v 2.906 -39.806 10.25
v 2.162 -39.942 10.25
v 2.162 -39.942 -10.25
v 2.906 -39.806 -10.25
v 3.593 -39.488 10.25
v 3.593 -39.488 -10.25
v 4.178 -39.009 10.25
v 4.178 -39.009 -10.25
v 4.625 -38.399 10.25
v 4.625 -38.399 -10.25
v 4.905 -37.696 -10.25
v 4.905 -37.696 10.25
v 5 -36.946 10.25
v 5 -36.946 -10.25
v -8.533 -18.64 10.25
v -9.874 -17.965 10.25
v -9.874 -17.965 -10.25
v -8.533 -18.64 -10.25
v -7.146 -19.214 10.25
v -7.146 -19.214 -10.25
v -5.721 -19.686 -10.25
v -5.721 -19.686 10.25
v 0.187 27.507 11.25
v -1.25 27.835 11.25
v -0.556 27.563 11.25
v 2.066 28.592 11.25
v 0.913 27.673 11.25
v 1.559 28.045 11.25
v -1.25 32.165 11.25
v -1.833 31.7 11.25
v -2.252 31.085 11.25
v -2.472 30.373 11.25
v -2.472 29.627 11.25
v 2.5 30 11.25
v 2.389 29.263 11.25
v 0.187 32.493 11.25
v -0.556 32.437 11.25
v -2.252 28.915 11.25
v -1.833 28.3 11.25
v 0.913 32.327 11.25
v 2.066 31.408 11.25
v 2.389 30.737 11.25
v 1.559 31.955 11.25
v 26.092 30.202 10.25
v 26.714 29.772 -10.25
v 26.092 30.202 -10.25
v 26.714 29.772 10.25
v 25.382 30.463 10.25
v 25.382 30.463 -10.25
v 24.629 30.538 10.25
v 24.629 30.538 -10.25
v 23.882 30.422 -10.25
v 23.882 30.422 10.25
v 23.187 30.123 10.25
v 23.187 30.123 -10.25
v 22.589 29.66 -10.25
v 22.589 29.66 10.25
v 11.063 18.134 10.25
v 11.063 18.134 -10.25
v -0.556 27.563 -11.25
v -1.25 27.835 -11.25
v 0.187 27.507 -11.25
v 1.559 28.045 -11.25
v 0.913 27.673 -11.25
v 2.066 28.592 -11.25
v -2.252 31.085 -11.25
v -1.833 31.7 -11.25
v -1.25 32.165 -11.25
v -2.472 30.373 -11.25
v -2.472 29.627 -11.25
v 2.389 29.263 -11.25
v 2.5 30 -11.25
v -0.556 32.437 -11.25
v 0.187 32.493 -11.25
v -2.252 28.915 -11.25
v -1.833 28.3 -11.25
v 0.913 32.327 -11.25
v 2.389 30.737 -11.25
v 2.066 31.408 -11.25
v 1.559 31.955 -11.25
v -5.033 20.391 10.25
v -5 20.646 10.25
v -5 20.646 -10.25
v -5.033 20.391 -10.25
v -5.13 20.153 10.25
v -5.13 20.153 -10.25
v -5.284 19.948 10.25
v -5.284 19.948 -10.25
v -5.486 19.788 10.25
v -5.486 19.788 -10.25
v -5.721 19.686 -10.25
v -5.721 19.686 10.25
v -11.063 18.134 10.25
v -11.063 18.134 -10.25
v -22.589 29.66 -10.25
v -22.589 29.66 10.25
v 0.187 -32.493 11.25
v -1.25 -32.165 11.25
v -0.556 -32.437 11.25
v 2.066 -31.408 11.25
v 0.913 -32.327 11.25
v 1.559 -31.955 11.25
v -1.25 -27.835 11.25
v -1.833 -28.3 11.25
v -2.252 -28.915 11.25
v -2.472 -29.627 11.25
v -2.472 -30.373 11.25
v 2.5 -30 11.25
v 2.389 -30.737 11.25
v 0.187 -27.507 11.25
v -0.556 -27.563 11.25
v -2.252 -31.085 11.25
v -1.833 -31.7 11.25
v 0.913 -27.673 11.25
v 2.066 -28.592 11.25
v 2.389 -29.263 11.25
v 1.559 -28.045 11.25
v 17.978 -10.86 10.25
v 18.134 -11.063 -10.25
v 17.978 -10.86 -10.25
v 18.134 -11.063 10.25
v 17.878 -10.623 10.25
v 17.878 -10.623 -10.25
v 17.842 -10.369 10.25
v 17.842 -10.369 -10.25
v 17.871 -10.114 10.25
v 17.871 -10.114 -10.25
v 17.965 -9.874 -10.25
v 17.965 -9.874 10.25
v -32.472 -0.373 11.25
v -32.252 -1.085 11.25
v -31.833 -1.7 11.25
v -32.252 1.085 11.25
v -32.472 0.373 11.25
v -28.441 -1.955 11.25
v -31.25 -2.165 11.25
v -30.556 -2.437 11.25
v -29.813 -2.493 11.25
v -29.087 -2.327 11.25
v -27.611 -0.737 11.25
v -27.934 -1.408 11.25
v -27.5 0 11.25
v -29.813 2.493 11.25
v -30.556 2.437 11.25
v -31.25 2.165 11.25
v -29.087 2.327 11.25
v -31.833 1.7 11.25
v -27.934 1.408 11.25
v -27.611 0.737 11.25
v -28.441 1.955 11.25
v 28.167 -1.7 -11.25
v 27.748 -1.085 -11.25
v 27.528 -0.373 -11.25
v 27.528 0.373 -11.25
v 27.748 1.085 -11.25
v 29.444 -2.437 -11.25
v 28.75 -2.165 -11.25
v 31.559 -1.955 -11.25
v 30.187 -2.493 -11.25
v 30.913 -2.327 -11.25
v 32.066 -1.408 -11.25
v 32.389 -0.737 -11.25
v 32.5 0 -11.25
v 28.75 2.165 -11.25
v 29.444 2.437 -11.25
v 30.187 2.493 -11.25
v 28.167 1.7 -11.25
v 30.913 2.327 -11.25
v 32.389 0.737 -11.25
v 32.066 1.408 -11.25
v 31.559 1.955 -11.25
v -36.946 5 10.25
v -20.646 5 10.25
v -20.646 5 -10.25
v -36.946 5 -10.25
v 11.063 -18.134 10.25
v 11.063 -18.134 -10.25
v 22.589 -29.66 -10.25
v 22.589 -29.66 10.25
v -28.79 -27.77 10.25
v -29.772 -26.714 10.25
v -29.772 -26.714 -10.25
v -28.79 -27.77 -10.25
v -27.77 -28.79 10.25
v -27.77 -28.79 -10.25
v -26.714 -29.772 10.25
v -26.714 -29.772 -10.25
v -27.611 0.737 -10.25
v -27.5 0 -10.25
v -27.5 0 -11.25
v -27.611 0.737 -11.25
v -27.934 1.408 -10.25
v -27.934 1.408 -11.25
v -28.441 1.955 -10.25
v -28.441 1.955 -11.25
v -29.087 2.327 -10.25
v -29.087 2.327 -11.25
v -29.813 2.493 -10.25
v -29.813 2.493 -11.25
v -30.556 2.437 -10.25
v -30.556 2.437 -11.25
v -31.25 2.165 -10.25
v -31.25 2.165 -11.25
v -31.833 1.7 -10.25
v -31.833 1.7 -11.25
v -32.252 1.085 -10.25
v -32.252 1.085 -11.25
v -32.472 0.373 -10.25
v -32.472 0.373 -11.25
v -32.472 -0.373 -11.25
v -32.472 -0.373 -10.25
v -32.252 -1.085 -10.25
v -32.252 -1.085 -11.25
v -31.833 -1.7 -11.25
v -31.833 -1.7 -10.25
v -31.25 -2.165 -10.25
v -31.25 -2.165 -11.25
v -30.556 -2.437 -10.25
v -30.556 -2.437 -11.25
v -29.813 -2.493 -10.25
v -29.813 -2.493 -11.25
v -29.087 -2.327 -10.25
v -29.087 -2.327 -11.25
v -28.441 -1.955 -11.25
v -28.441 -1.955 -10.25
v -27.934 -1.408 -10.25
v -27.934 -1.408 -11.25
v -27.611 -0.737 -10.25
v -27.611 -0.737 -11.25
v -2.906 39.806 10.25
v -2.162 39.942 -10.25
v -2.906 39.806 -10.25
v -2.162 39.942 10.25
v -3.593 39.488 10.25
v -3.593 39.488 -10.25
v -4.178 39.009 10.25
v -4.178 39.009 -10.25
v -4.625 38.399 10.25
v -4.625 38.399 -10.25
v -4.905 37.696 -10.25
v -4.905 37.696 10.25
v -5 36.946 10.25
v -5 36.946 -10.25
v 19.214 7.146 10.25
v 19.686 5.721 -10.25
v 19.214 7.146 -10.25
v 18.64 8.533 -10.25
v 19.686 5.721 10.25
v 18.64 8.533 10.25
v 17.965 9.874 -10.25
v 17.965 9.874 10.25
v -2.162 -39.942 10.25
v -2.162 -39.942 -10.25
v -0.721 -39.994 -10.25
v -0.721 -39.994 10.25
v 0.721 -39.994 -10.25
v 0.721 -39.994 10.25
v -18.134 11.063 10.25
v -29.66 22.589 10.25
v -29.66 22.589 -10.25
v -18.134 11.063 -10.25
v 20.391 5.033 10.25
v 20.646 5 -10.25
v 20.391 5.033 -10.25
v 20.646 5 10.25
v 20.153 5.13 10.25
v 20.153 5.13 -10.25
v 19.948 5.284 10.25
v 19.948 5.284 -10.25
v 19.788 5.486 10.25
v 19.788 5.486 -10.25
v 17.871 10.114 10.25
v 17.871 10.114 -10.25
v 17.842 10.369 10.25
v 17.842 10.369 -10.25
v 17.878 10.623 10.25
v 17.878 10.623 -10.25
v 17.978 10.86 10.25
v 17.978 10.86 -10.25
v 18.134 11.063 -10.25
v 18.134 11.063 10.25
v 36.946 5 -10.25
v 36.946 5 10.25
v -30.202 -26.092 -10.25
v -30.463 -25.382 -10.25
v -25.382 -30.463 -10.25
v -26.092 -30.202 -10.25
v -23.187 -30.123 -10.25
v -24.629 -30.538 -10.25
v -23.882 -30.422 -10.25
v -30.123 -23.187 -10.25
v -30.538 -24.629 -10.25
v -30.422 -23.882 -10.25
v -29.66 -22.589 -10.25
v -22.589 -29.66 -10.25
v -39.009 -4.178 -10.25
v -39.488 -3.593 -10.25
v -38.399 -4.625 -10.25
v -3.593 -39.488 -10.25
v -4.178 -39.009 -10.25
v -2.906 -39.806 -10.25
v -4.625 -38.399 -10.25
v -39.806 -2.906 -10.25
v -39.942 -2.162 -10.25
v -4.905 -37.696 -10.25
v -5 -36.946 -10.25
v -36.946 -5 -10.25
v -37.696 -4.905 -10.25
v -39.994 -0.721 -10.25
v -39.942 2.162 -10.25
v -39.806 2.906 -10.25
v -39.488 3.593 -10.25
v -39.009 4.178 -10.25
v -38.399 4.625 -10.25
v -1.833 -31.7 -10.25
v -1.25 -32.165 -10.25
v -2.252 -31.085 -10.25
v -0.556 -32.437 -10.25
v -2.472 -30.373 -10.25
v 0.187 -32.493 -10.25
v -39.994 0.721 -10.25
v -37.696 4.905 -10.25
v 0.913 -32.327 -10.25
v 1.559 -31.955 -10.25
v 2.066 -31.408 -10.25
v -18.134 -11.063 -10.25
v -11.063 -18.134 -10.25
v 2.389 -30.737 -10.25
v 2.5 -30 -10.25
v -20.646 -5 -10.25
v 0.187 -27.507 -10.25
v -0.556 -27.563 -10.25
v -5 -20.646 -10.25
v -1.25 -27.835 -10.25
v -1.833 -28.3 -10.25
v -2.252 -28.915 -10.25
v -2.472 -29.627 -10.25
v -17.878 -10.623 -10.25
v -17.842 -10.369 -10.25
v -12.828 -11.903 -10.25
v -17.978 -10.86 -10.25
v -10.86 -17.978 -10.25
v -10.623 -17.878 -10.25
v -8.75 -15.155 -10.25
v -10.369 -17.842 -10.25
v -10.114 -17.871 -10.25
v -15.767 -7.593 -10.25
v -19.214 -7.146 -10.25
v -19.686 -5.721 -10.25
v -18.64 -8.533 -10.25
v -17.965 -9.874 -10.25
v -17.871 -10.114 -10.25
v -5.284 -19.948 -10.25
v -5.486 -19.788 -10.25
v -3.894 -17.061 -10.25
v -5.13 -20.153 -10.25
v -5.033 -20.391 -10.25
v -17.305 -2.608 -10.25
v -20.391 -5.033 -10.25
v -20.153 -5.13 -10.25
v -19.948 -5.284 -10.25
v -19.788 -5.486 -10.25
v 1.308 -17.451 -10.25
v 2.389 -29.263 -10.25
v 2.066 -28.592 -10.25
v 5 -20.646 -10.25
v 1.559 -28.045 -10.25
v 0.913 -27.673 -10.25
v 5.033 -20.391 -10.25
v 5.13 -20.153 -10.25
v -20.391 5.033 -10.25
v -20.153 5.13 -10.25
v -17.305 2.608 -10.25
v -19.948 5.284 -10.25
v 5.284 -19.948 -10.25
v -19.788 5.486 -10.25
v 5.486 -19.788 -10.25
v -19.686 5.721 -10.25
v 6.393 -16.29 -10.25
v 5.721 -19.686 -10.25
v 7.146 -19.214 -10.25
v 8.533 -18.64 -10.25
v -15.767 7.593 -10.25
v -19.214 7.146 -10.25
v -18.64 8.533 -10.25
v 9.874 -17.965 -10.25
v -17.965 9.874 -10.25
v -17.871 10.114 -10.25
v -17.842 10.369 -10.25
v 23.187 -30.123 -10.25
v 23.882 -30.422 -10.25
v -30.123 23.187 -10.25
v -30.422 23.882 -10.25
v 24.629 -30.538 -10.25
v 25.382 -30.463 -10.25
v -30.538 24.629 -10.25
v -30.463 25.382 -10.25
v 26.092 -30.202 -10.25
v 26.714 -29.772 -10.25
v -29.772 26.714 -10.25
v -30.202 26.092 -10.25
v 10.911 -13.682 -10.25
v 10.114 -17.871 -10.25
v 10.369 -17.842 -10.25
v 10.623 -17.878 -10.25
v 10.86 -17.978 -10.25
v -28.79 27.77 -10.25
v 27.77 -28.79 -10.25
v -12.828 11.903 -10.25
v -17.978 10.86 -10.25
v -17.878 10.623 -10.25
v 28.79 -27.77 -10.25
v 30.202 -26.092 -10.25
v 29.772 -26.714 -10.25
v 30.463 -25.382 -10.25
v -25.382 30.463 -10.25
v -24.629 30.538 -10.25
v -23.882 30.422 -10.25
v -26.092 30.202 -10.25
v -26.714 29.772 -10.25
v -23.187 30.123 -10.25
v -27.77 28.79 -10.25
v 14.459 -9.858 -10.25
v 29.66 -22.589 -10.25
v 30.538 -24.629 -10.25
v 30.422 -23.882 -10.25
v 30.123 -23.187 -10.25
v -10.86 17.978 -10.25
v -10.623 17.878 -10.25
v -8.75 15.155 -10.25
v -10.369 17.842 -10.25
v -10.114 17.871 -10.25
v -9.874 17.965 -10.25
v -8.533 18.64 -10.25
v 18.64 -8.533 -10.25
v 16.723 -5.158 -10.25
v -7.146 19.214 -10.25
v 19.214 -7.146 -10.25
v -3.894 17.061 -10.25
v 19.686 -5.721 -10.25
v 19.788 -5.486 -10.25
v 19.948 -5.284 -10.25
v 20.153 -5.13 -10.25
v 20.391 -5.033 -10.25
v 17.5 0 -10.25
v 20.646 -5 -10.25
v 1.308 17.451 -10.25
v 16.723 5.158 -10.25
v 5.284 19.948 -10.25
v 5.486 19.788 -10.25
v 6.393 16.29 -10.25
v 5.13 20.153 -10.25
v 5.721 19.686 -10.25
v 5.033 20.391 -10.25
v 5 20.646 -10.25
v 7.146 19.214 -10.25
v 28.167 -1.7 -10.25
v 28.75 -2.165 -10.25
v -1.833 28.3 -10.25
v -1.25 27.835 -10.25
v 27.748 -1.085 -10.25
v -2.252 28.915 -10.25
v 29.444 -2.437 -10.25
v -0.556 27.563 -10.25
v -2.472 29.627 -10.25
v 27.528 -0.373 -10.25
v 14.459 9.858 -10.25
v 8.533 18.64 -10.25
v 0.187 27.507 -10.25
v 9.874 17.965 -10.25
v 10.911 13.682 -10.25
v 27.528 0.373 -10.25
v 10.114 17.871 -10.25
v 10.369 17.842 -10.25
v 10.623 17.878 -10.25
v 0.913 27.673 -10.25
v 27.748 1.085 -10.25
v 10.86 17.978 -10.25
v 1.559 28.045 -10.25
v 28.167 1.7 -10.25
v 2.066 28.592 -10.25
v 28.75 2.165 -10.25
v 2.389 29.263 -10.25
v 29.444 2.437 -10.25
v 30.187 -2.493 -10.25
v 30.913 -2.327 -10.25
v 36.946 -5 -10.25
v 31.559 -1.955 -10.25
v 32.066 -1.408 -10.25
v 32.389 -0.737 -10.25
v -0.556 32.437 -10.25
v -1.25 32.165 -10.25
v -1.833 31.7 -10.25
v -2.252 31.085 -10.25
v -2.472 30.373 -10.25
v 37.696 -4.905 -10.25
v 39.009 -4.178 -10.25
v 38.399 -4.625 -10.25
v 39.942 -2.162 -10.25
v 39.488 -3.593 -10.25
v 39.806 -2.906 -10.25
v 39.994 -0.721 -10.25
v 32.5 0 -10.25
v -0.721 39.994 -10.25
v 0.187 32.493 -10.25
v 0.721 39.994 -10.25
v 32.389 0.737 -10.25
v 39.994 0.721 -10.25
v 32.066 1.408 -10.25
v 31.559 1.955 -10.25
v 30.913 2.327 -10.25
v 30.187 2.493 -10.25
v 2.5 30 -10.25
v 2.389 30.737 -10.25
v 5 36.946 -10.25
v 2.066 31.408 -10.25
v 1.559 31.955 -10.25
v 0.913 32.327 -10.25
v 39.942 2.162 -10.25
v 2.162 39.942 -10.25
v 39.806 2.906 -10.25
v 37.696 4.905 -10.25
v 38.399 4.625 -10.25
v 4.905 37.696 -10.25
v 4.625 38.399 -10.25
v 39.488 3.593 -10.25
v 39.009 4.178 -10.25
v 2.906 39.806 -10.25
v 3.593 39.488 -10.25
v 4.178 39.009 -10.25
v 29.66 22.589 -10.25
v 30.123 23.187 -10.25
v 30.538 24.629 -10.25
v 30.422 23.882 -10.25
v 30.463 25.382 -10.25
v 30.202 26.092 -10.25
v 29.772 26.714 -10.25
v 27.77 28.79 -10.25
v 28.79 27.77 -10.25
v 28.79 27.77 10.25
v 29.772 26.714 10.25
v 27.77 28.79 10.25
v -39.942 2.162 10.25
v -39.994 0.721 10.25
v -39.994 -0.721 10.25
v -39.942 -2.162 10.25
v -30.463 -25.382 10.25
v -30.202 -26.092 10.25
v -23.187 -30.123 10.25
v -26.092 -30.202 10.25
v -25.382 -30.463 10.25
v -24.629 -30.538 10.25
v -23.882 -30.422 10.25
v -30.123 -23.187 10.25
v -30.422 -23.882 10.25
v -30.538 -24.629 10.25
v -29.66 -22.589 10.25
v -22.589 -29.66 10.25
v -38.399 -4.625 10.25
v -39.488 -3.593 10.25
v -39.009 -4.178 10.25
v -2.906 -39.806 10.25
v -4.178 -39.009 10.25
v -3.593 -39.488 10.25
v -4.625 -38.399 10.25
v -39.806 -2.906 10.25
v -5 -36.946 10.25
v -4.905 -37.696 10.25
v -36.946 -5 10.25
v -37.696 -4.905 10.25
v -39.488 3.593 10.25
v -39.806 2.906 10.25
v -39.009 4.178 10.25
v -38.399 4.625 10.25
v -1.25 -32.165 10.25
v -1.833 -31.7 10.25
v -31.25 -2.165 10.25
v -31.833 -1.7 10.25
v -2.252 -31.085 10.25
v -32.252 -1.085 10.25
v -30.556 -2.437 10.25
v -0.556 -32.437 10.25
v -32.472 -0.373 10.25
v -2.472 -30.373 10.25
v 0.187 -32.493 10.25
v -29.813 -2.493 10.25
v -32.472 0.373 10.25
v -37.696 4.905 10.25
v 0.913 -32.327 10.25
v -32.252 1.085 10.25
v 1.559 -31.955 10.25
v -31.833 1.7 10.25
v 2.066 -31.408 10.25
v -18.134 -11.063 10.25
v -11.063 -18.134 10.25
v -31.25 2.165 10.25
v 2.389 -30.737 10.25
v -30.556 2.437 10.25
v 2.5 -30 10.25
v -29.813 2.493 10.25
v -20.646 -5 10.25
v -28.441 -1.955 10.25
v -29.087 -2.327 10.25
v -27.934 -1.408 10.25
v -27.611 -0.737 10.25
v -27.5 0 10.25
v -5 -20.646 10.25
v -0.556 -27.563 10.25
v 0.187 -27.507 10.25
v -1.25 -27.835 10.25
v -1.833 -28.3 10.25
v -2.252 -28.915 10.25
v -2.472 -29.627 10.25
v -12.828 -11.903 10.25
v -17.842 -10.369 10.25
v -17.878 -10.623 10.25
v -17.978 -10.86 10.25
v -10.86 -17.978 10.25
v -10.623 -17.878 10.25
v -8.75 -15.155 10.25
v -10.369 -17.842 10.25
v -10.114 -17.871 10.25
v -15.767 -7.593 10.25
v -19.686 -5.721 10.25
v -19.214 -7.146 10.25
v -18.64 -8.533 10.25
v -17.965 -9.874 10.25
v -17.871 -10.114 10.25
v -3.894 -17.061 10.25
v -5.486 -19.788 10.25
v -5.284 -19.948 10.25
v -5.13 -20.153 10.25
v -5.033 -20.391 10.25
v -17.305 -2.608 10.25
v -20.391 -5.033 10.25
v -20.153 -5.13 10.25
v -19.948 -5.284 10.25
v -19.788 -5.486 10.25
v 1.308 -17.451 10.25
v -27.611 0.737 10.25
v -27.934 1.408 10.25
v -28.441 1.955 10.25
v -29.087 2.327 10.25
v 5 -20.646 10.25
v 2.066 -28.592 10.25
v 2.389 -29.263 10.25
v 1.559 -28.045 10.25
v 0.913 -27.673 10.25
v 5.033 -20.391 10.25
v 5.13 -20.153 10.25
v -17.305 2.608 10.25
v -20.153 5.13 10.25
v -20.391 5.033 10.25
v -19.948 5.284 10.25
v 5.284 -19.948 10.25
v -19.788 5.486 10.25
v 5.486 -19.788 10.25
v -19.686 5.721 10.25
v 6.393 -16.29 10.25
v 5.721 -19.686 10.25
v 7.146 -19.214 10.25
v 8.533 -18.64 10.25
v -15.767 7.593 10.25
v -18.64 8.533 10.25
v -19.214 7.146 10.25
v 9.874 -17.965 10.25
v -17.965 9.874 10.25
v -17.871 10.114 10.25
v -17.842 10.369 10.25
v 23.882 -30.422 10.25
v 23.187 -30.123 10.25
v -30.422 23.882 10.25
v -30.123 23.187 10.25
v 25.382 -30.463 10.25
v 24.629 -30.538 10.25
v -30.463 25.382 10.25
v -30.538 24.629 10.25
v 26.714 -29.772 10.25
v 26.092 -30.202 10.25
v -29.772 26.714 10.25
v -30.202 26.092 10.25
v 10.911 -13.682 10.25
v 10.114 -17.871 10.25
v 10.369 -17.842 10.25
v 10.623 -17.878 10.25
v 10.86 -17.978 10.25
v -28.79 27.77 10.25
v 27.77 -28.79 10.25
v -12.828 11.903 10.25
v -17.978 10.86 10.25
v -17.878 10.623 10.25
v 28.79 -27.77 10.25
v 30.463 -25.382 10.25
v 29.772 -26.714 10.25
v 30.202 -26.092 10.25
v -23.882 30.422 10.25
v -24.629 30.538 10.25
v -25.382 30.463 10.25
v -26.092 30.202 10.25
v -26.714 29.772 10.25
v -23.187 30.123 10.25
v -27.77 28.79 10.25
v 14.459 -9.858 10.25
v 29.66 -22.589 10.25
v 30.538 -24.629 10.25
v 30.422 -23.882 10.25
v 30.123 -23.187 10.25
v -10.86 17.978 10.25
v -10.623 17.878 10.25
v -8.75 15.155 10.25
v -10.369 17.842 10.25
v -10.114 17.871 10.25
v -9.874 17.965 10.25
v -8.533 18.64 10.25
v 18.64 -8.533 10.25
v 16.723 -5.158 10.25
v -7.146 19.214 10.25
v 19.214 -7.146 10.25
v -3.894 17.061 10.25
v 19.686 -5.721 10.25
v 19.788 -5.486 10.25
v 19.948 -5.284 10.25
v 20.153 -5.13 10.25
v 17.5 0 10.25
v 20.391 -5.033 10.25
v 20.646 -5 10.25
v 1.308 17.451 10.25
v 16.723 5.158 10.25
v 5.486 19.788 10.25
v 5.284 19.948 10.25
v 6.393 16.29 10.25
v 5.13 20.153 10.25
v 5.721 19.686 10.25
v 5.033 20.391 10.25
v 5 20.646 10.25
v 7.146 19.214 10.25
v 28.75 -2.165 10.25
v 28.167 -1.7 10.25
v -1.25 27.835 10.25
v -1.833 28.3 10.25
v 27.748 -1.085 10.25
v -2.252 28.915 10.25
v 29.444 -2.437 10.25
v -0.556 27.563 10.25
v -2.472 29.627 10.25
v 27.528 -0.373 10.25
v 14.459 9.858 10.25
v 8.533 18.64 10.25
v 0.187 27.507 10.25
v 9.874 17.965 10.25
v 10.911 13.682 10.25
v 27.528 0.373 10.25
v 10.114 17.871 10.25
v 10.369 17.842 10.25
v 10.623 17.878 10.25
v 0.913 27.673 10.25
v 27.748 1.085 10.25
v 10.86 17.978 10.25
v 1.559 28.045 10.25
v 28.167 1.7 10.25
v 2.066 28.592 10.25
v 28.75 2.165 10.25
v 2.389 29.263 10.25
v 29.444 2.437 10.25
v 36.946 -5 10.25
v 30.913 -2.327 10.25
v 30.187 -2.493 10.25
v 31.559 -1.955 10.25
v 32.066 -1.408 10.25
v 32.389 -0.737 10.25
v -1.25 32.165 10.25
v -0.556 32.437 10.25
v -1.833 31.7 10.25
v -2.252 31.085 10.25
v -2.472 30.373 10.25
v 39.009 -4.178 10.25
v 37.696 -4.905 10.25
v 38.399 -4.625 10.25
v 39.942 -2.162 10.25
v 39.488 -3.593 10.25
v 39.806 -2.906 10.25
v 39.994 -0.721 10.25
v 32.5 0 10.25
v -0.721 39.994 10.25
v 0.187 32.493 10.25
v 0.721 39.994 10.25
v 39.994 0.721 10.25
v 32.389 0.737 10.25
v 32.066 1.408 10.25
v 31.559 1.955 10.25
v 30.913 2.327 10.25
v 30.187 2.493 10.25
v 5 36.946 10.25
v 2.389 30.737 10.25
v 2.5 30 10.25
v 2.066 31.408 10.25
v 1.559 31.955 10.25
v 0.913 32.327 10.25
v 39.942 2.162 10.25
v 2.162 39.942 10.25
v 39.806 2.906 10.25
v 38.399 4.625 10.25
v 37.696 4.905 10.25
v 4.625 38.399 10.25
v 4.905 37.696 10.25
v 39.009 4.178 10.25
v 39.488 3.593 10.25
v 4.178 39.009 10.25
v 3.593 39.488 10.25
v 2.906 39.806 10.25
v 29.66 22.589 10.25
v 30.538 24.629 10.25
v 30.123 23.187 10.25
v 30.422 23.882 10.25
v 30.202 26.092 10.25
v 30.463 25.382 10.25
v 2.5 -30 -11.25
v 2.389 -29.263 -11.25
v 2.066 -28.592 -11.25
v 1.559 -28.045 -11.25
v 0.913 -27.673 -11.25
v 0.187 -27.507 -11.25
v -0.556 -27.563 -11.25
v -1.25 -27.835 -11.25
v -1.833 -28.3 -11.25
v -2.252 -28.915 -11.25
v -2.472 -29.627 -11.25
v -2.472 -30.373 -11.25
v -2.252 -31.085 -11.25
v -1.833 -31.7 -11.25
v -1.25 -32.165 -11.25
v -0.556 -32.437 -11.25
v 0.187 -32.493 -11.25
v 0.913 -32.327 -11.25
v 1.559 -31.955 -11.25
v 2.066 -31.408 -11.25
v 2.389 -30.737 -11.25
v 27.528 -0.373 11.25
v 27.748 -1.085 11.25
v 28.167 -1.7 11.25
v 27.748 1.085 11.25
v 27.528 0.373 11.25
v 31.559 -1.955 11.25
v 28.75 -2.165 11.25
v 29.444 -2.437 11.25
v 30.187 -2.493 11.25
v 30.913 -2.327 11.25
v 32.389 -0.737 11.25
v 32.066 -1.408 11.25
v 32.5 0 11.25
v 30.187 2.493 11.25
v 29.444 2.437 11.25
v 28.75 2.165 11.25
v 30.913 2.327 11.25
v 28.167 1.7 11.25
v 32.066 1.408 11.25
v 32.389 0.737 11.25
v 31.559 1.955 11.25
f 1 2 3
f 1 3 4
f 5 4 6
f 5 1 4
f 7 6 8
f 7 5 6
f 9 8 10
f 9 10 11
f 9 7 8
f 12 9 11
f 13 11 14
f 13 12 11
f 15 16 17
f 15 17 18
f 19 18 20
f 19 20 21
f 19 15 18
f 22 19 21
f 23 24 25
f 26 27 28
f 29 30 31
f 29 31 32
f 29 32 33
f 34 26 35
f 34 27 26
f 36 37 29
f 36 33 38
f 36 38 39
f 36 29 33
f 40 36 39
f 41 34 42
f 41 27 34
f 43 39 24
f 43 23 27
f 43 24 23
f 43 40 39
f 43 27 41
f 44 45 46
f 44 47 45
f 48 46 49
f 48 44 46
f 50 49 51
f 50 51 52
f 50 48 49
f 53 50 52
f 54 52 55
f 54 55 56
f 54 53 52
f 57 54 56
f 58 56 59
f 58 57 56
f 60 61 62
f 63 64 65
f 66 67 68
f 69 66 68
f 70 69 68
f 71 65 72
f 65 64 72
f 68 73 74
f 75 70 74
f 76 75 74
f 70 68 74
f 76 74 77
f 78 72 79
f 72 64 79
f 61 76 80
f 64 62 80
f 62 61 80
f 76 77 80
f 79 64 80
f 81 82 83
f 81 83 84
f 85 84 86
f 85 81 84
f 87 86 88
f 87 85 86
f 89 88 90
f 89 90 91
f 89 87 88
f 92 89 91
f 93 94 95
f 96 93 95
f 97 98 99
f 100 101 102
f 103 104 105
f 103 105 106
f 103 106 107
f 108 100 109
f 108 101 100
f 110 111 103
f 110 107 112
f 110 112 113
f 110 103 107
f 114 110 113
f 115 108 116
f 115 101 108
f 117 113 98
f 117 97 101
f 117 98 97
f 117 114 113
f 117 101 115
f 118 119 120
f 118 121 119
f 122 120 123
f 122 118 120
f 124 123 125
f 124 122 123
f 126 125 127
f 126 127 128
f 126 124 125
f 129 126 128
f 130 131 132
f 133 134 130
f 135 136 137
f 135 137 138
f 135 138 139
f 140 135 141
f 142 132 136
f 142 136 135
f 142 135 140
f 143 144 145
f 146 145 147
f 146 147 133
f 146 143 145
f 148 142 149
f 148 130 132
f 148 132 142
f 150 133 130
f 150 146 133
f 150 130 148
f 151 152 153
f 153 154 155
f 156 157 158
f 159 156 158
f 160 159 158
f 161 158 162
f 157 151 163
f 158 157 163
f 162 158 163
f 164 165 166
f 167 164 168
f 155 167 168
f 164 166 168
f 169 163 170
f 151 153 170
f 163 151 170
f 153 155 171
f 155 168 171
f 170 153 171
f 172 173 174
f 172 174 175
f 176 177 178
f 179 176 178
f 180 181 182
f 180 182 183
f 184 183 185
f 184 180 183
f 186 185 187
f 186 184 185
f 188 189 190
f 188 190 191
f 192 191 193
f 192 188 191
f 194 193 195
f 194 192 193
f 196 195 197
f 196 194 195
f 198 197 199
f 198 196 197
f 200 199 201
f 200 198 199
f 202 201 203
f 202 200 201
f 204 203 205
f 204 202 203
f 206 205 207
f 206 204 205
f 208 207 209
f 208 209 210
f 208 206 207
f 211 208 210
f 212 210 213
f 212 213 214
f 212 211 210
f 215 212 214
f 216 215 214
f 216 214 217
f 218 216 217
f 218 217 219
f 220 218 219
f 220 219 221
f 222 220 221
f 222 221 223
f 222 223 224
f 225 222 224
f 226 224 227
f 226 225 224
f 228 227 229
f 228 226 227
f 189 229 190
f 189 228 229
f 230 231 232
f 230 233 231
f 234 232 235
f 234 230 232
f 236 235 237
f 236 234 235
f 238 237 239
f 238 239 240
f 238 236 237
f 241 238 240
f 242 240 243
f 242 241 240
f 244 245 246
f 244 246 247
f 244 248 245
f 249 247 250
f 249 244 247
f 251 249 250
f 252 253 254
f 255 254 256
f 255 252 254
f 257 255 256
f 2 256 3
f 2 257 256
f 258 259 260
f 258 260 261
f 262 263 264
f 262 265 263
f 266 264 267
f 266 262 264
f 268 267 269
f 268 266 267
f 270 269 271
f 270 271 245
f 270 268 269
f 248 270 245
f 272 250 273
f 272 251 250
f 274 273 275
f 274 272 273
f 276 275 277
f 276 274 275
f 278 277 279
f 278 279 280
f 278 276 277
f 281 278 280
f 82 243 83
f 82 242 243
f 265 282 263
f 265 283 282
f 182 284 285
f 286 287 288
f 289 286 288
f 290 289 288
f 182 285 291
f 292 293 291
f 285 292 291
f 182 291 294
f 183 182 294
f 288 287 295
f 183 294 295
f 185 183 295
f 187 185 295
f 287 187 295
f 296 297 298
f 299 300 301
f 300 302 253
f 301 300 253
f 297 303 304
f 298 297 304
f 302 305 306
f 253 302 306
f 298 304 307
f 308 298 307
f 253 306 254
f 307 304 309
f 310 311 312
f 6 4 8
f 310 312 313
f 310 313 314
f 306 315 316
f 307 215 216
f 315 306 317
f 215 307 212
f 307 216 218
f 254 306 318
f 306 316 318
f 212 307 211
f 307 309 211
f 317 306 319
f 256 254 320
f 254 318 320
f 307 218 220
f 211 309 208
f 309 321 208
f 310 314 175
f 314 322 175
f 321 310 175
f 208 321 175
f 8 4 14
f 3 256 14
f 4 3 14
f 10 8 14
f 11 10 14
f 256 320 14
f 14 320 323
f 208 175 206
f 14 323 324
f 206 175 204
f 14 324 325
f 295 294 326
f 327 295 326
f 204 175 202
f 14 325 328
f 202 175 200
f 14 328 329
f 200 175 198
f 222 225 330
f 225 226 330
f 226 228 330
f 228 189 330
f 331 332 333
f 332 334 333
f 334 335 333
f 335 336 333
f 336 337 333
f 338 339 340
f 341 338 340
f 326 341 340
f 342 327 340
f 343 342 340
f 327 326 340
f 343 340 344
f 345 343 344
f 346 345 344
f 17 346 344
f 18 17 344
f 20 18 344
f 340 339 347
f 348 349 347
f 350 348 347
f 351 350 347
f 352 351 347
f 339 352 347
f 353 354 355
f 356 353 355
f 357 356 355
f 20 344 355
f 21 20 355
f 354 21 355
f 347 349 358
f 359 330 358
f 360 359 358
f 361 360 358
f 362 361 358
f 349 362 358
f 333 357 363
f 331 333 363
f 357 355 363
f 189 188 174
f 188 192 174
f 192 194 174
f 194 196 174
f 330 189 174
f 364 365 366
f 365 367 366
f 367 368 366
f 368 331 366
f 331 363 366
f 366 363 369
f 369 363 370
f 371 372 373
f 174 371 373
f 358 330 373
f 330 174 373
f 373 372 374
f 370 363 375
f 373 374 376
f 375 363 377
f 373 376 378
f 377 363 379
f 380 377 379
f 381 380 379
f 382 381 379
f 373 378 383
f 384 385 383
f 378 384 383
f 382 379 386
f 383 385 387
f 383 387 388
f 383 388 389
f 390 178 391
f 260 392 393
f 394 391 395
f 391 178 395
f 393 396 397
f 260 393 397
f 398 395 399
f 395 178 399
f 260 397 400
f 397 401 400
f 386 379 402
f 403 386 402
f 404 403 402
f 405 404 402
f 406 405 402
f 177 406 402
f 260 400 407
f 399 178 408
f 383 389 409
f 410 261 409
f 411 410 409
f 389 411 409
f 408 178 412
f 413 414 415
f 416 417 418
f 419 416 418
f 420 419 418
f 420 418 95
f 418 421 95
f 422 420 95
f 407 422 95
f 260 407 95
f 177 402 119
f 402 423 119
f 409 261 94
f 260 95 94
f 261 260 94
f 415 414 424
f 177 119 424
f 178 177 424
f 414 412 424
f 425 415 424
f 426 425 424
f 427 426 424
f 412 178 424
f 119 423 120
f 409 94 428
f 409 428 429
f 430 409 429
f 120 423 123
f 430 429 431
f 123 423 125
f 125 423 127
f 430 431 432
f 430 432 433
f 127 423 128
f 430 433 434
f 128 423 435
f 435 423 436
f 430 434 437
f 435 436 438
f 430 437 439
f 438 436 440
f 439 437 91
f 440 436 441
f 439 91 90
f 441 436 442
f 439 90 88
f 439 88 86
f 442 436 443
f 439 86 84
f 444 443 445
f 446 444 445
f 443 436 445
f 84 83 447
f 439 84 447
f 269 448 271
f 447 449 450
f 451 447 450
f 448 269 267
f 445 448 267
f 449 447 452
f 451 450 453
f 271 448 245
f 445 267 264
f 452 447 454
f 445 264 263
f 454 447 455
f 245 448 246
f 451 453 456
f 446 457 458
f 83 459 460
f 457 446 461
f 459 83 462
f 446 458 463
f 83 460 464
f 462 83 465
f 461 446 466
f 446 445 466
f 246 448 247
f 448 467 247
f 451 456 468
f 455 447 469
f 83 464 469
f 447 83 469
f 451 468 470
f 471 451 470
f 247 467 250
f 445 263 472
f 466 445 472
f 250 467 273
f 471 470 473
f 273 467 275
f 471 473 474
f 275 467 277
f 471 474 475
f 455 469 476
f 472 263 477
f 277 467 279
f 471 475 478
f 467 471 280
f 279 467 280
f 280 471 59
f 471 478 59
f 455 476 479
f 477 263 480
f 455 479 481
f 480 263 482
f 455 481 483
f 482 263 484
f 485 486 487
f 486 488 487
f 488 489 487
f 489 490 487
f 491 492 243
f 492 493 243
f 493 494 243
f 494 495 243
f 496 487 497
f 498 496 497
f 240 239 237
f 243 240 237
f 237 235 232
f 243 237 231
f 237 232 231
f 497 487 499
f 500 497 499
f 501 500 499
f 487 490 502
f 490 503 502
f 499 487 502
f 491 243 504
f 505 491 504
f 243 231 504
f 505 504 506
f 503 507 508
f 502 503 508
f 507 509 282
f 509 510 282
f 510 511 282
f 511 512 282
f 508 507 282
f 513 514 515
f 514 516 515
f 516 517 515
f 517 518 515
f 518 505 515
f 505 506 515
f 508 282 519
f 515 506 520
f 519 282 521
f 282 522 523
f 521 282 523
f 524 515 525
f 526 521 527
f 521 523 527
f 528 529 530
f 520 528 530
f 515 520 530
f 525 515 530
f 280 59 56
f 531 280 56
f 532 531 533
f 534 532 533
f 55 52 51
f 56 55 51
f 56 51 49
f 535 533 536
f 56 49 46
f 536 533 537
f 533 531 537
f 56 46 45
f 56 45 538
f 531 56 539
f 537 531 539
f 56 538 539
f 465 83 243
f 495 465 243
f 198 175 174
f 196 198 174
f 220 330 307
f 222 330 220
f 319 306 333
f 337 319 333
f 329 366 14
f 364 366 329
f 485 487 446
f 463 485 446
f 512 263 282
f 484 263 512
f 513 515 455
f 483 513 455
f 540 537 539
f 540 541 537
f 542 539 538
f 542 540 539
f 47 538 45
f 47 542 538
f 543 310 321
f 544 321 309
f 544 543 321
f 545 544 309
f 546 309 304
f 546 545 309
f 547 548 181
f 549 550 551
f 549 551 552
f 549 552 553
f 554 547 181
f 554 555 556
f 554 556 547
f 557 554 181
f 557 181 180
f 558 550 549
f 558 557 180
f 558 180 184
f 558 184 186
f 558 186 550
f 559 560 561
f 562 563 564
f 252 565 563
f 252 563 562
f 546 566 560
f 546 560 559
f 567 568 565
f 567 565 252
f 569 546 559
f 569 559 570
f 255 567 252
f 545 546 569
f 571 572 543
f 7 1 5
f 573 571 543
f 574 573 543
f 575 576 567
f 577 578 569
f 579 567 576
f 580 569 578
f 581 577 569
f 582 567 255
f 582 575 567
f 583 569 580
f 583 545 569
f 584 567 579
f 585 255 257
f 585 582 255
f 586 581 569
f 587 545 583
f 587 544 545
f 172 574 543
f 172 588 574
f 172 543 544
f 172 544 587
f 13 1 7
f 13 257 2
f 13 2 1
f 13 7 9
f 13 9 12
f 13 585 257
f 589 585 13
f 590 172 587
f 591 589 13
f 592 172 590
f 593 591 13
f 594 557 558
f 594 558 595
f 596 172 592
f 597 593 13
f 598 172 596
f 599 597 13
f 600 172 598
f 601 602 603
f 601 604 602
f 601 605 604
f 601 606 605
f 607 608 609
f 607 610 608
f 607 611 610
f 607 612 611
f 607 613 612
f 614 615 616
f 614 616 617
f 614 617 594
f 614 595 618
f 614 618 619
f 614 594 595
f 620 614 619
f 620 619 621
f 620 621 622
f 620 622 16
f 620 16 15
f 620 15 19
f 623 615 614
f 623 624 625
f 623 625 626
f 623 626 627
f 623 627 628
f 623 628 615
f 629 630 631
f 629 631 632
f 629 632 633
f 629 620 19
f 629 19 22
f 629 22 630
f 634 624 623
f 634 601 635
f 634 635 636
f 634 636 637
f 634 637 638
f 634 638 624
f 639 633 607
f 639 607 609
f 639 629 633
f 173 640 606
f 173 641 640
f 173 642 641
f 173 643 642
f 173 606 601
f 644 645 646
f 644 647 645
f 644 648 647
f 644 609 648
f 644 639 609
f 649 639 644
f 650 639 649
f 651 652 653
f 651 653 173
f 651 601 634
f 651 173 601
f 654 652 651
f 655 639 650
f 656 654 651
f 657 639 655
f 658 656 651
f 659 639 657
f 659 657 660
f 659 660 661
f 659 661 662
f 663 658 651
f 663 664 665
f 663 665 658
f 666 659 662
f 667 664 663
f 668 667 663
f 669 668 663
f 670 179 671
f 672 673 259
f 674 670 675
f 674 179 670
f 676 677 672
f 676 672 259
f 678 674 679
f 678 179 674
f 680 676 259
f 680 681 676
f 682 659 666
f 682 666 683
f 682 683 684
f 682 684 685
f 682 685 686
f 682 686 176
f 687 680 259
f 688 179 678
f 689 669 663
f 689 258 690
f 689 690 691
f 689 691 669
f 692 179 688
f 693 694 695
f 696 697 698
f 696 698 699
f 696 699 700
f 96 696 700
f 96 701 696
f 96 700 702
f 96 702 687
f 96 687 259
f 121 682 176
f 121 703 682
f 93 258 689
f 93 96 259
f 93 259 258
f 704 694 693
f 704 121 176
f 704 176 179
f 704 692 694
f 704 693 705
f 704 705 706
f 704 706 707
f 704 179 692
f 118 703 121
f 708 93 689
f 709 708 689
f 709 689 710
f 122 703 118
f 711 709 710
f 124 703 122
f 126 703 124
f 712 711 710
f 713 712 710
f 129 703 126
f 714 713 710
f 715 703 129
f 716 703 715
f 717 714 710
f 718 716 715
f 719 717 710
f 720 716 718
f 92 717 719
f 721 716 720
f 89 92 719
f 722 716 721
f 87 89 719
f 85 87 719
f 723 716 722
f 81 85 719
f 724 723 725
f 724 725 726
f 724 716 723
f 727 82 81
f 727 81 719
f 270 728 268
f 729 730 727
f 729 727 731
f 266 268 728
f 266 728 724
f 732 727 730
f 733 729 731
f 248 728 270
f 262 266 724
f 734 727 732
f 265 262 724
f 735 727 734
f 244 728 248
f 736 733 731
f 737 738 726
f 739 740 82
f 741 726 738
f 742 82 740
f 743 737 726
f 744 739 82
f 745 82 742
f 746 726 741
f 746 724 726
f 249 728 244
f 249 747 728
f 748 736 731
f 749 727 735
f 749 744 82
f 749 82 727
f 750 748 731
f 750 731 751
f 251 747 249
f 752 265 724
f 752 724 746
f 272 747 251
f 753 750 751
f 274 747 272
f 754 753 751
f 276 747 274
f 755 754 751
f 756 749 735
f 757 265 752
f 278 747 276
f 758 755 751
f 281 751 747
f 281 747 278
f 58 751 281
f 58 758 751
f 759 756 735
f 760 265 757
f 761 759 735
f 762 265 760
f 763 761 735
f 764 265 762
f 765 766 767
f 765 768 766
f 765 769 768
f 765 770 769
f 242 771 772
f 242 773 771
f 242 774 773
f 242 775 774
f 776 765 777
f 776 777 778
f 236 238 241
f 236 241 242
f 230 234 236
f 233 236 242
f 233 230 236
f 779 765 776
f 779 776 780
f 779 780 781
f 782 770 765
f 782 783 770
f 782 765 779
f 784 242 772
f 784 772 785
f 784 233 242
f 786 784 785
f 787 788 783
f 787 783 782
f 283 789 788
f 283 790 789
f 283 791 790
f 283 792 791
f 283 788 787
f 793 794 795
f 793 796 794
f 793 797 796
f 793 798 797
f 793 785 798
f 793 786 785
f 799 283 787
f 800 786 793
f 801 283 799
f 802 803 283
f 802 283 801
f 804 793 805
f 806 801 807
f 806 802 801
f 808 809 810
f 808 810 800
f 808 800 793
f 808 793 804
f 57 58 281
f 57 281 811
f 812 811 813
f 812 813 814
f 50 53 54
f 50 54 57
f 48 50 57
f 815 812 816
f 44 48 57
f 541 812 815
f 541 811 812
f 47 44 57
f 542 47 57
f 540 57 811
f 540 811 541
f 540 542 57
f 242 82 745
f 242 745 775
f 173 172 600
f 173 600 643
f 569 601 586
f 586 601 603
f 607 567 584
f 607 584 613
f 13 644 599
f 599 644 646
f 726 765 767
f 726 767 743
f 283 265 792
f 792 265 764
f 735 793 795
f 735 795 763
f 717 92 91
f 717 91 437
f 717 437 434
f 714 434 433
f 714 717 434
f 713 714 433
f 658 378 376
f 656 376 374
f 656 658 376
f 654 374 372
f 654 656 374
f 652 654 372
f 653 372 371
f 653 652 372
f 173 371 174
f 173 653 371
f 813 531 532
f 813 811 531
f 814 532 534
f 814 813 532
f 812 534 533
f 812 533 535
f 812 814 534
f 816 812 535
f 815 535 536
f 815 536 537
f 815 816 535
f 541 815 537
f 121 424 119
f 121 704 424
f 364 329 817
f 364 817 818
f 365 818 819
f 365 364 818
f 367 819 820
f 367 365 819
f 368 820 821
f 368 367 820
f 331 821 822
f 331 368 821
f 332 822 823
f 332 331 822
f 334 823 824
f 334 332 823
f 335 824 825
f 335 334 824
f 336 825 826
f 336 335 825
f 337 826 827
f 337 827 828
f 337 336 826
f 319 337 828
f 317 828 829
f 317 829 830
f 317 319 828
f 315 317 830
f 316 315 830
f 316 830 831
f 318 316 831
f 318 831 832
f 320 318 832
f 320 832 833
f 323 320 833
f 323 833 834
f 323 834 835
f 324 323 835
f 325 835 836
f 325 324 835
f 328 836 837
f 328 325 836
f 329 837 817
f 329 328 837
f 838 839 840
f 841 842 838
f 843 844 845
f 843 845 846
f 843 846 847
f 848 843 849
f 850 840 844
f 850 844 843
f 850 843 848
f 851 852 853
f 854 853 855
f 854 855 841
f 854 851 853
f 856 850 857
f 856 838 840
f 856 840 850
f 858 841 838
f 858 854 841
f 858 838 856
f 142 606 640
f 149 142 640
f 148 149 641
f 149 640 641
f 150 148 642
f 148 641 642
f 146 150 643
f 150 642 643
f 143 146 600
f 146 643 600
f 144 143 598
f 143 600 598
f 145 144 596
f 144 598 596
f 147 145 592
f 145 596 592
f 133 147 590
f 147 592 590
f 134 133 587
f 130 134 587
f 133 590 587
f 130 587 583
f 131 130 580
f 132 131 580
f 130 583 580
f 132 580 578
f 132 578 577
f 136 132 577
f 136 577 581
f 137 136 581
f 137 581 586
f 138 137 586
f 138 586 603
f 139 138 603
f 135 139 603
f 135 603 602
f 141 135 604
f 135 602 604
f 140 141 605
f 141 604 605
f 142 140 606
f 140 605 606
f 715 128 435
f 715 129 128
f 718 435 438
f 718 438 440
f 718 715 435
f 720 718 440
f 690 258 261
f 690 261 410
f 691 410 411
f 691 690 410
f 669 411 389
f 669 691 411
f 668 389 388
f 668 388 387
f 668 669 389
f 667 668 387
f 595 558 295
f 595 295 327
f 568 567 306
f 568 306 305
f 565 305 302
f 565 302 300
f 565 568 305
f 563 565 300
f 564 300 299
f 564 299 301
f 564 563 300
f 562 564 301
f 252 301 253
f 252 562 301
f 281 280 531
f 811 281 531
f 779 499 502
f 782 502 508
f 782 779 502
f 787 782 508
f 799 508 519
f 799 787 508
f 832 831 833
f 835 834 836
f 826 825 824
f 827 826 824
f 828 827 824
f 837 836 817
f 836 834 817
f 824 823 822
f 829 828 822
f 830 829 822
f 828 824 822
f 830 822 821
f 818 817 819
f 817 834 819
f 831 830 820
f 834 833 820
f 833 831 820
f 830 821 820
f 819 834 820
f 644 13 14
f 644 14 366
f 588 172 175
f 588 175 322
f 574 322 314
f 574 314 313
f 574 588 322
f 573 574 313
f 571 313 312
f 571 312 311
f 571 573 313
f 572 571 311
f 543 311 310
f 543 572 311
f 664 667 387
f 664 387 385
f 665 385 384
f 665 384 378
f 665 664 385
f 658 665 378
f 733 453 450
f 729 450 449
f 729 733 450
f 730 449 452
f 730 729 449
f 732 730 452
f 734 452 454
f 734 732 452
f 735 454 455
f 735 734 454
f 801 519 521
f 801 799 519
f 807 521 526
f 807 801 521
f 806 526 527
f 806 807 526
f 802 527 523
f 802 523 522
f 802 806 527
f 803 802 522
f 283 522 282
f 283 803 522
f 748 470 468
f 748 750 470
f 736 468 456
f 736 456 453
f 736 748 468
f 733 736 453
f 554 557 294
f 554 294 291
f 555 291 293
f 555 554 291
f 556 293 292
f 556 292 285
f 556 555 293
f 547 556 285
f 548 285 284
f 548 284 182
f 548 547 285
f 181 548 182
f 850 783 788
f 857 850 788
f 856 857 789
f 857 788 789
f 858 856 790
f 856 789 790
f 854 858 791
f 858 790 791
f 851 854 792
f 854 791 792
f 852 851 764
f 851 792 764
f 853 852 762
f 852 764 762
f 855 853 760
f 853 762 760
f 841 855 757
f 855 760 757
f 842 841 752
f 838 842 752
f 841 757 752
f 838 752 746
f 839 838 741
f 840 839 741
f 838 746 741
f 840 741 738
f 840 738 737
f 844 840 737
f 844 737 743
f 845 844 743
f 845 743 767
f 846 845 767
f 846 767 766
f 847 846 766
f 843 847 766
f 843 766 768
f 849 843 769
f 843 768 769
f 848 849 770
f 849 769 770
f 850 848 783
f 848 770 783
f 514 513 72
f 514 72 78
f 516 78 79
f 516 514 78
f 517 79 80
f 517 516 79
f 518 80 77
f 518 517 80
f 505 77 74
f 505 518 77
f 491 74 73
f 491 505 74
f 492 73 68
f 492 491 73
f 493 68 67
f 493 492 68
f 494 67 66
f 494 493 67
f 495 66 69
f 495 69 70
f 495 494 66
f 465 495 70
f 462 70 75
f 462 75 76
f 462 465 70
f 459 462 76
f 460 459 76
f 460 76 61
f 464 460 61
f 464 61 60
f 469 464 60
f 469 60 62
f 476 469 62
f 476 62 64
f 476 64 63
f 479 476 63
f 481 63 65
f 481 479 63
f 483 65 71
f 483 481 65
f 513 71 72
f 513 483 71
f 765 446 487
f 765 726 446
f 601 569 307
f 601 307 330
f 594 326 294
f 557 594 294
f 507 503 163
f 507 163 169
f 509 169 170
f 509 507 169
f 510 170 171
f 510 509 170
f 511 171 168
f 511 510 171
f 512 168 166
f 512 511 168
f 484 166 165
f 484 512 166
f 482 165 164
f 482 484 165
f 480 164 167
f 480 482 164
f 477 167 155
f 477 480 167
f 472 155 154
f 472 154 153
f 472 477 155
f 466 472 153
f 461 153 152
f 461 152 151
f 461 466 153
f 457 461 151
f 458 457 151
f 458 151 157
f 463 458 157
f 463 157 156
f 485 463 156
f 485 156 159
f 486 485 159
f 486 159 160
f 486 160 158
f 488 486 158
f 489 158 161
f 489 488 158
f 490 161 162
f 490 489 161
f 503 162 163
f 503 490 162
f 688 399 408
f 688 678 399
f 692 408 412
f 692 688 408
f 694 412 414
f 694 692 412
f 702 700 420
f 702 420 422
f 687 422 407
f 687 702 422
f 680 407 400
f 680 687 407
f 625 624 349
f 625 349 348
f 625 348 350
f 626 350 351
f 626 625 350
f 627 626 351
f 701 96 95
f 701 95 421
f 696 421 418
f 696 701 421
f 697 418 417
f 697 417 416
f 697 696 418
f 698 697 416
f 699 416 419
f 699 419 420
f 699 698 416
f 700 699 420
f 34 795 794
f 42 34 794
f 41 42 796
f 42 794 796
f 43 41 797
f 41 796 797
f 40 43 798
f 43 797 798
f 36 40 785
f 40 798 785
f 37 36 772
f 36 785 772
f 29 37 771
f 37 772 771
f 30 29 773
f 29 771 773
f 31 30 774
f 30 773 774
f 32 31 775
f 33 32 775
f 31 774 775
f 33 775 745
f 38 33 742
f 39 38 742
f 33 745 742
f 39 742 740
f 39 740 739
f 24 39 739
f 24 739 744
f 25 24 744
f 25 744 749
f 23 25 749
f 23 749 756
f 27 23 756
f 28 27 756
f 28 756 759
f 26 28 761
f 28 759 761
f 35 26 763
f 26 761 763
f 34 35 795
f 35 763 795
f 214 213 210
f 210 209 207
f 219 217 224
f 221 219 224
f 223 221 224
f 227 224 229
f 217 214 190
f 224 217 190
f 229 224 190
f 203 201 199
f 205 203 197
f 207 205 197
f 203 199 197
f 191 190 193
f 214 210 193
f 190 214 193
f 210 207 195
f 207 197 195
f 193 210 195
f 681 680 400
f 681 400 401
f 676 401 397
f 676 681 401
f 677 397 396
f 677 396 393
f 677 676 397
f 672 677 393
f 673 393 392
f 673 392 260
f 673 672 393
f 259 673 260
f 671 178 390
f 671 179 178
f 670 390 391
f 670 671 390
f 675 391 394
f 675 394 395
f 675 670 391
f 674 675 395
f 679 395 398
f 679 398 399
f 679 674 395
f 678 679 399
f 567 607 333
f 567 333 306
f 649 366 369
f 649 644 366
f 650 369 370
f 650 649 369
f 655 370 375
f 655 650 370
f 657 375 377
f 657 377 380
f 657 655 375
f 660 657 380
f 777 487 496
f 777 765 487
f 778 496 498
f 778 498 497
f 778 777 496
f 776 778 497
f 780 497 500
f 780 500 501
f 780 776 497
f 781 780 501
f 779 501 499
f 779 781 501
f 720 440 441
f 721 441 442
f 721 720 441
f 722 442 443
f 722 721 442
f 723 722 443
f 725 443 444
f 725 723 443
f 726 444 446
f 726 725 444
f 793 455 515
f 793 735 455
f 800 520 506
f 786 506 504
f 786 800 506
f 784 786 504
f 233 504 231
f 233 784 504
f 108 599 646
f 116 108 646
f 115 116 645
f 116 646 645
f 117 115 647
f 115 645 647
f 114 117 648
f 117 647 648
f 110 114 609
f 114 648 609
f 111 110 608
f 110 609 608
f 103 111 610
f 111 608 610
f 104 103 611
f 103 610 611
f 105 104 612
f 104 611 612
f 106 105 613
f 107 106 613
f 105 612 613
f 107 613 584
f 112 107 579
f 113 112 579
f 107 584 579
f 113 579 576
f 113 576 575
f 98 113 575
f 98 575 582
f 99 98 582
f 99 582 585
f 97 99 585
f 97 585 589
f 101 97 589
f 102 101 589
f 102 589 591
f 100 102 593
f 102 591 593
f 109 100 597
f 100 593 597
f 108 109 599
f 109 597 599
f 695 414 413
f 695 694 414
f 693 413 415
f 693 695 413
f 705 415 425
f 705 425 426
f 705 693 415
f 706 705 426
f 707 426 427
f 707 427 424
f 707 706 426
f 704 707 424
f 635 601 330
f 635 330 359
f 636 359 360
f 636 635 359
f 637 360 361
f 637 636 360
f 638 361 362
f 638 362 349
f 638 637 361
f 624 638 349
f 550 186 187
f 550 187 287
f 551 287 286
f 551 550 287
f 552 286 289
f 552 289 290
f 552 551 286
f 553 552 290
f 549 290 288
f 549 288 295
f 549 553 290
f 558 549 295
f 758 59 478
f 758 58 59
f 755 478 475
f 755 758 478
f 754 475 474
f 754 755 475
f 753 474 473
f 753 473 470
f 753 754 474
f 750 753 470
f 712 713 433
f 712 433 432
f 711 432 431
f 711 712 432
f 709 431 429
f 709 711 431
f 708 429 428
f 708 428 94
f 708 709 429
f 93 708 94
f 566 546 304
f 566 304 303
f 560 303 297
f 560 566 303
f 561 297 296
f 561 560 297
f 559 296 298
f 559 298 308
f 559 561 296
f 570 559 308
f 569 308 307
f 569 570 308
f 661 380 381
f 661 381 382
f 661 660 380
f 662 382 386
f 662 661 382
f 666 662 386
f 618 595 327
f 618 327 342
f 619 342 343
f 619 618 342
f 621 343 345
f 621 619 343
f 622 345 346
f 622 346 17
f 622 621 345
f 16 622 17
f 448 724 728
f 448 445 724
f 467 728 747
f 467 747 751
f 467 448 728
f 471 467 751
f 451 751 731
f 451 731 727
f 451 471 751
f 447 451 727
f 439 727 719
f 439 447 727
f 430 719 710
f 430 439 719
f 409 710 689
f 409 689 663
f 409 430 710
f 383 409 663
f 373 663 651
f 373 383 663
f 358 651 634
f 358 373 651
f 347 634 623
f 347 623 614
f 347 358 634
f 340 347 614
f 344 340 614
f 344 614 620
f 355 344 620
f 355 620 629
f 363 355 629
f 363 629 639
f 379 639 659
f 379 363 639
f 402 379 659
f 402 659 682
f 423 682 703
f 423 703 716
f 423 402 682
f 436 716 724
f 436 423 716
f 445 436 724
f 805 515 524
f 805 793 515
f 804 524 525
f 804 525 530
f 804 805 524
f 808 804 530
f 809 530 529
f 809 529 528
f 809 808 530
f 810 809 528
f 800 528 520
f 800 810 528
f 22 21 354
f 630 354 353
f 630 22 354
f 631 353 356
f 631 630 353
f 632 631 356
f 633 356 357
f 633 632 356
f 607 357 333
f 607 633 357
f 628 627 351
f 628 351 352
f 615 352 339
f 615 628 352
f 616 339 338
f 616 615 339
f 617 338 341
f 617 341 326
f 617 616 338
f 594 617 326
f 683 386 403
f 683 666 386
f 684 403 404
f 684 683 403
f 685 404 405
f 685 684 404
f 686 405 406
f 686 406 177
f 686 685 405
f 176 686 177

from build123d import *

# Parameters (mm, degrees)
SKETCH1_R           = 17.5
BOSS_EXTRUDE1_DEPTH = 10.25
SKETCH2_R           = 2.5
BOSS_EXTRUDE2_DEPTH = 1


with BuildPart() as part:
    # Sketch1 → Boss-Extrude1 (new body, symmetric)
    with BuildSketch(Plane.XY):
        with BuildLine():
            Line((-5, 36.945906404), (-5, 20.645822822))
            ThreePointArc((-5, 20.645822822), (-5.200290751, 20.04543535), (-5.720930233, 19.685551993))
            ThreePointArc((-5.720930233, 19.685551993), (-7.845010363, 18.939530416), (-9.874478744, 17.965095868))
            ThreePointArc((-9.874478744, 17.965095868), (-10.497102414, 17.851424122), (-11.063267415, 18.134335227))
            Line((-11.063267415, 18.134335227), (-22.589167049, 29.660234861))
            ThreePointArc((-22.589167049, 29.660234861), (-24.629376661, 30.537817825), (-26.714040425, 29.771799478))
            ThreePointArc((-26.714040425, 29.771799478), (-28.284271247, 28.284271247), (-29.771799478, 26.714040425))
            ThreePointArc((-29.771799478, 26.714040425), (-30.537817825, 24.629376661), (-29.660234861, 22.589167049))
            Line((-29.660234861, 22.589167049), (-18.134335227, 11.063267415))
            ThreePointArc((-18.134335227, 11.063267415), (-17.851424122, 10.497102414), (-17.965095868, 9.874478744))
            ThreePointArc((-17.965095868, 9.874478744), (-18.939530416, 7.845010363), (-19.685551993, 5.720930233))
            ThreePointArc((-19.685551993, 5.720930233), (-20.04543535, 5.200290751), (-20.645822822, 5))
            Line((-20.645822822, 5), (-36.945906404, 5))
            ThreePointArc((-36.945906404, 5), (-39.00909732, 4.177898814), (-39.941520437, 2.162162162))
            ThreePointArc((-39.941520437, 2.162162162), (-40, 0), (-39.941520437, -2.162162162))
            ThreePointArc((-39.941520437, -2.162162162), (-39.00909732, -4.177898814), (-36.945906404, -5))
            Line((-36.945906404, -5), (-20.645822822, -5))
            ThreePointArc((-20.645822822, -5), (-20.04543535, -5.200290751), (-19.685551993, -5.720930233))
            ThreePointArc((-19.685551993, -5.720930233), (-18.939530416, -7.845010363), (-17.965095868, -9.874478744))
            ThreePointArc((-17.965095868, -9.874478744), (-17.851424122, -10.497102414), (-18.134335227, -11.063267415))
            Line((-18.134335227, -11.063267415), (-29.660234861, -22.589167049))
            ThreePointArc((-29.660234861, -22.589167049), (-30.537817825, -24.629376661), (-29.771799478, -26.714040425))
            ThreePointArc((-29.771799478, -26.714040425), (-28.284271247, -28.284271247), (-26.714040425, -29.771799478))
            ThreePointArc((-26.714040425, -29.771799478), (-24.629376661, -30.537817825), (-22.589167049, -29.660234861))
            Line((-22.589167049, -29.660234861), (-11.063267415, -18.134335227))
            ThreePointArc((-11.063267415, -18.134335227), (-10.497102414, -17.851424122), (-9.874478744, -17.965095868))
            ThreePointArc((-9.874478744, -17.965095868), (-7.845010363, -18.939530416), (-5.720930233, -19.685551993))
            ThreePointArc((-5.720930233, -19.685551993), (-5.200290751, -20.04543535), (-5, -20.645822822))
            Line((-5, -20.645822822), (-5, -36.945906404))
            ThreePointArc((-5, -36.945906404), (-4.177898814, -39.00909732), (-2.162162162, -39.941520437))
            ThreePointArc((-2.162162162, -39.941520437), (0, -40), (2.162162162, -39.941520437))
            ThreePointArc((2.162162162, -39.941520437), (4.177898814, -39.00909732), (5, -36.945906404))
            Line((5, -36.945906404), (5, -20.645822822))
            ThreePointArc((5, -20.645822822), (5.200290751, -20.04543535), (5.720930233, -19.685551993))
            ThreePointArc((5.720930233, -19.685551993), (7.845010363, -18.939530416), (9.874478744, -17.965095868))
            ThreePointArc((9.874478744, -17.965095868), (10.497102414, -17.851424122), (11.063267415, -18.134335227))
            Line((11.063267415, -18.134335227), (22.589167049, -29.660234861))
            ThreePointArc((22.589167049, -29.660234861), (24.629376661, -30.537817825), (26.714040425, -29.771799478))
            ThreePointArc((26.714040425, -29.771799478), (28.284271247, -28.284271247), (29.771799478, -26.714040425))
            ThreePointArc((29.771799478, -26.714040425), (30.537817825, -24.629376661), (29.660234861, -22.589167049))
            Line((29.660234861, -22.589167049), (18.134335227, -11.063267415))
            ThreePointArc((18.134335227, -11.063267415), (17.851424122, -10.497102414), (17.965095868, -9.874478744))
            ThreePointArc((17.965095868, -9.874478744), (18.939530416, -7.845010363), (19.685551993, -5.720930233))
            ThreePointArc((19.685551993, -5.720930233), (20.04543535, -5.200290751), (20.645822822, -5))
            Line((20.645822822, -5), (36.945906404, -5))
            ThreePointArc((36.945906404, -5), (39.00909732, -4.177898814), (39.941520437, -2.162162162))
            ThreePointArc((39.941520437, -2.162162162), (40, 0), (39.941520437, 2.162162162))
            ThreePointArc((39.941520437, 2.162162162), (39.00909732, 4.177898814), (36.945906404, 5))
            Line((36.945906404, 5), (20.645822822, 5))
            ThreePointArc((20.645822822, 5), (20.04543535, 5.200290751), (19.685551993, 5.720930233))
            ThreePointArc((19.685551993, 5.720930233), (18.939530416, 7.845010363), (17.965095868, 9.874478744))
            ThreePointArc((17.965095868, 9.874478744), (17.851424122, 10.497102414), (18.134335227, 11.063267415))
            Line((18.134335227, 11.063267415), (29.660234861, 22.589167049))
            ThreePointArc((29.660234861, 22.589167049), (30.537817825, 24.629376661), (29.771799478, 26.714040425))
            ThreePointArc((29.771799478, 26.714040425), (28.284271247, 28.284271247), (26.714040425, 29.771799478))
            ThreePointArc((26.714040425, 29.771799478), (24.629376661, 30.537817825), (22.589167049, 29.660234861))
            Line((22.589167049, 29.660234861), (11.063267415, 18.134335227))
            ThreePointArc((11.063267415, 18.134335227), (10.497102414, 17.851424122), (9.874478744, 17.965095868))
            ThreePointArc((9.874478744, 17.965095868), (7.845010363, 18.939530416), (5.720930233, 19.685551993))
            ThreePointArc((5.720930233, 19.685551993), (5.200290751, 20.04543535), (5, 20.645822822))
            Line((5, 20.645822822), (5, 36.945906404))
            ThreePointArc((5, 36.945906404), (4.177898814, 39.00909732), (2.162162162, 39.941520437))
            ThreePointArc((2.162162162, 39.941520437), (0, 40), (-2.162162162, 39.941520437))
            ThreePointArc((-2.162162162, 39.941520437), (-4.177898814, 39.00909732), (-5, 36.945906404))
        make_face()
        Circle(SKETCH1_R, mode=Mode.SUBTRACT)
    extrude(amount=BOSS_EXTRUDE1_DEPTH, both=True)

    # Sketch2 → Boss-Extrude2 (add)
    with BuildSketch(Plane.XY.offset(10.25)):
        with Locations((0, 30)):
            Circle(SKETCH2_R)
        with Locations((30, 0)):
            Circle(SKETCH2_R)
        with Locations((0, -30)):
            Circle(SKETCH2_R)
        with Locations((-30, 0)):
            Circle(SKETCH2_R)
    boss_extrude2 = extrude(amount=BOSS_EXTRUDE2_DEPTH)

    # Mirror1: Boss-Extrude2 across plane
    add(boss_extrude2.mirror(Plane.XY))


solid = part.part
